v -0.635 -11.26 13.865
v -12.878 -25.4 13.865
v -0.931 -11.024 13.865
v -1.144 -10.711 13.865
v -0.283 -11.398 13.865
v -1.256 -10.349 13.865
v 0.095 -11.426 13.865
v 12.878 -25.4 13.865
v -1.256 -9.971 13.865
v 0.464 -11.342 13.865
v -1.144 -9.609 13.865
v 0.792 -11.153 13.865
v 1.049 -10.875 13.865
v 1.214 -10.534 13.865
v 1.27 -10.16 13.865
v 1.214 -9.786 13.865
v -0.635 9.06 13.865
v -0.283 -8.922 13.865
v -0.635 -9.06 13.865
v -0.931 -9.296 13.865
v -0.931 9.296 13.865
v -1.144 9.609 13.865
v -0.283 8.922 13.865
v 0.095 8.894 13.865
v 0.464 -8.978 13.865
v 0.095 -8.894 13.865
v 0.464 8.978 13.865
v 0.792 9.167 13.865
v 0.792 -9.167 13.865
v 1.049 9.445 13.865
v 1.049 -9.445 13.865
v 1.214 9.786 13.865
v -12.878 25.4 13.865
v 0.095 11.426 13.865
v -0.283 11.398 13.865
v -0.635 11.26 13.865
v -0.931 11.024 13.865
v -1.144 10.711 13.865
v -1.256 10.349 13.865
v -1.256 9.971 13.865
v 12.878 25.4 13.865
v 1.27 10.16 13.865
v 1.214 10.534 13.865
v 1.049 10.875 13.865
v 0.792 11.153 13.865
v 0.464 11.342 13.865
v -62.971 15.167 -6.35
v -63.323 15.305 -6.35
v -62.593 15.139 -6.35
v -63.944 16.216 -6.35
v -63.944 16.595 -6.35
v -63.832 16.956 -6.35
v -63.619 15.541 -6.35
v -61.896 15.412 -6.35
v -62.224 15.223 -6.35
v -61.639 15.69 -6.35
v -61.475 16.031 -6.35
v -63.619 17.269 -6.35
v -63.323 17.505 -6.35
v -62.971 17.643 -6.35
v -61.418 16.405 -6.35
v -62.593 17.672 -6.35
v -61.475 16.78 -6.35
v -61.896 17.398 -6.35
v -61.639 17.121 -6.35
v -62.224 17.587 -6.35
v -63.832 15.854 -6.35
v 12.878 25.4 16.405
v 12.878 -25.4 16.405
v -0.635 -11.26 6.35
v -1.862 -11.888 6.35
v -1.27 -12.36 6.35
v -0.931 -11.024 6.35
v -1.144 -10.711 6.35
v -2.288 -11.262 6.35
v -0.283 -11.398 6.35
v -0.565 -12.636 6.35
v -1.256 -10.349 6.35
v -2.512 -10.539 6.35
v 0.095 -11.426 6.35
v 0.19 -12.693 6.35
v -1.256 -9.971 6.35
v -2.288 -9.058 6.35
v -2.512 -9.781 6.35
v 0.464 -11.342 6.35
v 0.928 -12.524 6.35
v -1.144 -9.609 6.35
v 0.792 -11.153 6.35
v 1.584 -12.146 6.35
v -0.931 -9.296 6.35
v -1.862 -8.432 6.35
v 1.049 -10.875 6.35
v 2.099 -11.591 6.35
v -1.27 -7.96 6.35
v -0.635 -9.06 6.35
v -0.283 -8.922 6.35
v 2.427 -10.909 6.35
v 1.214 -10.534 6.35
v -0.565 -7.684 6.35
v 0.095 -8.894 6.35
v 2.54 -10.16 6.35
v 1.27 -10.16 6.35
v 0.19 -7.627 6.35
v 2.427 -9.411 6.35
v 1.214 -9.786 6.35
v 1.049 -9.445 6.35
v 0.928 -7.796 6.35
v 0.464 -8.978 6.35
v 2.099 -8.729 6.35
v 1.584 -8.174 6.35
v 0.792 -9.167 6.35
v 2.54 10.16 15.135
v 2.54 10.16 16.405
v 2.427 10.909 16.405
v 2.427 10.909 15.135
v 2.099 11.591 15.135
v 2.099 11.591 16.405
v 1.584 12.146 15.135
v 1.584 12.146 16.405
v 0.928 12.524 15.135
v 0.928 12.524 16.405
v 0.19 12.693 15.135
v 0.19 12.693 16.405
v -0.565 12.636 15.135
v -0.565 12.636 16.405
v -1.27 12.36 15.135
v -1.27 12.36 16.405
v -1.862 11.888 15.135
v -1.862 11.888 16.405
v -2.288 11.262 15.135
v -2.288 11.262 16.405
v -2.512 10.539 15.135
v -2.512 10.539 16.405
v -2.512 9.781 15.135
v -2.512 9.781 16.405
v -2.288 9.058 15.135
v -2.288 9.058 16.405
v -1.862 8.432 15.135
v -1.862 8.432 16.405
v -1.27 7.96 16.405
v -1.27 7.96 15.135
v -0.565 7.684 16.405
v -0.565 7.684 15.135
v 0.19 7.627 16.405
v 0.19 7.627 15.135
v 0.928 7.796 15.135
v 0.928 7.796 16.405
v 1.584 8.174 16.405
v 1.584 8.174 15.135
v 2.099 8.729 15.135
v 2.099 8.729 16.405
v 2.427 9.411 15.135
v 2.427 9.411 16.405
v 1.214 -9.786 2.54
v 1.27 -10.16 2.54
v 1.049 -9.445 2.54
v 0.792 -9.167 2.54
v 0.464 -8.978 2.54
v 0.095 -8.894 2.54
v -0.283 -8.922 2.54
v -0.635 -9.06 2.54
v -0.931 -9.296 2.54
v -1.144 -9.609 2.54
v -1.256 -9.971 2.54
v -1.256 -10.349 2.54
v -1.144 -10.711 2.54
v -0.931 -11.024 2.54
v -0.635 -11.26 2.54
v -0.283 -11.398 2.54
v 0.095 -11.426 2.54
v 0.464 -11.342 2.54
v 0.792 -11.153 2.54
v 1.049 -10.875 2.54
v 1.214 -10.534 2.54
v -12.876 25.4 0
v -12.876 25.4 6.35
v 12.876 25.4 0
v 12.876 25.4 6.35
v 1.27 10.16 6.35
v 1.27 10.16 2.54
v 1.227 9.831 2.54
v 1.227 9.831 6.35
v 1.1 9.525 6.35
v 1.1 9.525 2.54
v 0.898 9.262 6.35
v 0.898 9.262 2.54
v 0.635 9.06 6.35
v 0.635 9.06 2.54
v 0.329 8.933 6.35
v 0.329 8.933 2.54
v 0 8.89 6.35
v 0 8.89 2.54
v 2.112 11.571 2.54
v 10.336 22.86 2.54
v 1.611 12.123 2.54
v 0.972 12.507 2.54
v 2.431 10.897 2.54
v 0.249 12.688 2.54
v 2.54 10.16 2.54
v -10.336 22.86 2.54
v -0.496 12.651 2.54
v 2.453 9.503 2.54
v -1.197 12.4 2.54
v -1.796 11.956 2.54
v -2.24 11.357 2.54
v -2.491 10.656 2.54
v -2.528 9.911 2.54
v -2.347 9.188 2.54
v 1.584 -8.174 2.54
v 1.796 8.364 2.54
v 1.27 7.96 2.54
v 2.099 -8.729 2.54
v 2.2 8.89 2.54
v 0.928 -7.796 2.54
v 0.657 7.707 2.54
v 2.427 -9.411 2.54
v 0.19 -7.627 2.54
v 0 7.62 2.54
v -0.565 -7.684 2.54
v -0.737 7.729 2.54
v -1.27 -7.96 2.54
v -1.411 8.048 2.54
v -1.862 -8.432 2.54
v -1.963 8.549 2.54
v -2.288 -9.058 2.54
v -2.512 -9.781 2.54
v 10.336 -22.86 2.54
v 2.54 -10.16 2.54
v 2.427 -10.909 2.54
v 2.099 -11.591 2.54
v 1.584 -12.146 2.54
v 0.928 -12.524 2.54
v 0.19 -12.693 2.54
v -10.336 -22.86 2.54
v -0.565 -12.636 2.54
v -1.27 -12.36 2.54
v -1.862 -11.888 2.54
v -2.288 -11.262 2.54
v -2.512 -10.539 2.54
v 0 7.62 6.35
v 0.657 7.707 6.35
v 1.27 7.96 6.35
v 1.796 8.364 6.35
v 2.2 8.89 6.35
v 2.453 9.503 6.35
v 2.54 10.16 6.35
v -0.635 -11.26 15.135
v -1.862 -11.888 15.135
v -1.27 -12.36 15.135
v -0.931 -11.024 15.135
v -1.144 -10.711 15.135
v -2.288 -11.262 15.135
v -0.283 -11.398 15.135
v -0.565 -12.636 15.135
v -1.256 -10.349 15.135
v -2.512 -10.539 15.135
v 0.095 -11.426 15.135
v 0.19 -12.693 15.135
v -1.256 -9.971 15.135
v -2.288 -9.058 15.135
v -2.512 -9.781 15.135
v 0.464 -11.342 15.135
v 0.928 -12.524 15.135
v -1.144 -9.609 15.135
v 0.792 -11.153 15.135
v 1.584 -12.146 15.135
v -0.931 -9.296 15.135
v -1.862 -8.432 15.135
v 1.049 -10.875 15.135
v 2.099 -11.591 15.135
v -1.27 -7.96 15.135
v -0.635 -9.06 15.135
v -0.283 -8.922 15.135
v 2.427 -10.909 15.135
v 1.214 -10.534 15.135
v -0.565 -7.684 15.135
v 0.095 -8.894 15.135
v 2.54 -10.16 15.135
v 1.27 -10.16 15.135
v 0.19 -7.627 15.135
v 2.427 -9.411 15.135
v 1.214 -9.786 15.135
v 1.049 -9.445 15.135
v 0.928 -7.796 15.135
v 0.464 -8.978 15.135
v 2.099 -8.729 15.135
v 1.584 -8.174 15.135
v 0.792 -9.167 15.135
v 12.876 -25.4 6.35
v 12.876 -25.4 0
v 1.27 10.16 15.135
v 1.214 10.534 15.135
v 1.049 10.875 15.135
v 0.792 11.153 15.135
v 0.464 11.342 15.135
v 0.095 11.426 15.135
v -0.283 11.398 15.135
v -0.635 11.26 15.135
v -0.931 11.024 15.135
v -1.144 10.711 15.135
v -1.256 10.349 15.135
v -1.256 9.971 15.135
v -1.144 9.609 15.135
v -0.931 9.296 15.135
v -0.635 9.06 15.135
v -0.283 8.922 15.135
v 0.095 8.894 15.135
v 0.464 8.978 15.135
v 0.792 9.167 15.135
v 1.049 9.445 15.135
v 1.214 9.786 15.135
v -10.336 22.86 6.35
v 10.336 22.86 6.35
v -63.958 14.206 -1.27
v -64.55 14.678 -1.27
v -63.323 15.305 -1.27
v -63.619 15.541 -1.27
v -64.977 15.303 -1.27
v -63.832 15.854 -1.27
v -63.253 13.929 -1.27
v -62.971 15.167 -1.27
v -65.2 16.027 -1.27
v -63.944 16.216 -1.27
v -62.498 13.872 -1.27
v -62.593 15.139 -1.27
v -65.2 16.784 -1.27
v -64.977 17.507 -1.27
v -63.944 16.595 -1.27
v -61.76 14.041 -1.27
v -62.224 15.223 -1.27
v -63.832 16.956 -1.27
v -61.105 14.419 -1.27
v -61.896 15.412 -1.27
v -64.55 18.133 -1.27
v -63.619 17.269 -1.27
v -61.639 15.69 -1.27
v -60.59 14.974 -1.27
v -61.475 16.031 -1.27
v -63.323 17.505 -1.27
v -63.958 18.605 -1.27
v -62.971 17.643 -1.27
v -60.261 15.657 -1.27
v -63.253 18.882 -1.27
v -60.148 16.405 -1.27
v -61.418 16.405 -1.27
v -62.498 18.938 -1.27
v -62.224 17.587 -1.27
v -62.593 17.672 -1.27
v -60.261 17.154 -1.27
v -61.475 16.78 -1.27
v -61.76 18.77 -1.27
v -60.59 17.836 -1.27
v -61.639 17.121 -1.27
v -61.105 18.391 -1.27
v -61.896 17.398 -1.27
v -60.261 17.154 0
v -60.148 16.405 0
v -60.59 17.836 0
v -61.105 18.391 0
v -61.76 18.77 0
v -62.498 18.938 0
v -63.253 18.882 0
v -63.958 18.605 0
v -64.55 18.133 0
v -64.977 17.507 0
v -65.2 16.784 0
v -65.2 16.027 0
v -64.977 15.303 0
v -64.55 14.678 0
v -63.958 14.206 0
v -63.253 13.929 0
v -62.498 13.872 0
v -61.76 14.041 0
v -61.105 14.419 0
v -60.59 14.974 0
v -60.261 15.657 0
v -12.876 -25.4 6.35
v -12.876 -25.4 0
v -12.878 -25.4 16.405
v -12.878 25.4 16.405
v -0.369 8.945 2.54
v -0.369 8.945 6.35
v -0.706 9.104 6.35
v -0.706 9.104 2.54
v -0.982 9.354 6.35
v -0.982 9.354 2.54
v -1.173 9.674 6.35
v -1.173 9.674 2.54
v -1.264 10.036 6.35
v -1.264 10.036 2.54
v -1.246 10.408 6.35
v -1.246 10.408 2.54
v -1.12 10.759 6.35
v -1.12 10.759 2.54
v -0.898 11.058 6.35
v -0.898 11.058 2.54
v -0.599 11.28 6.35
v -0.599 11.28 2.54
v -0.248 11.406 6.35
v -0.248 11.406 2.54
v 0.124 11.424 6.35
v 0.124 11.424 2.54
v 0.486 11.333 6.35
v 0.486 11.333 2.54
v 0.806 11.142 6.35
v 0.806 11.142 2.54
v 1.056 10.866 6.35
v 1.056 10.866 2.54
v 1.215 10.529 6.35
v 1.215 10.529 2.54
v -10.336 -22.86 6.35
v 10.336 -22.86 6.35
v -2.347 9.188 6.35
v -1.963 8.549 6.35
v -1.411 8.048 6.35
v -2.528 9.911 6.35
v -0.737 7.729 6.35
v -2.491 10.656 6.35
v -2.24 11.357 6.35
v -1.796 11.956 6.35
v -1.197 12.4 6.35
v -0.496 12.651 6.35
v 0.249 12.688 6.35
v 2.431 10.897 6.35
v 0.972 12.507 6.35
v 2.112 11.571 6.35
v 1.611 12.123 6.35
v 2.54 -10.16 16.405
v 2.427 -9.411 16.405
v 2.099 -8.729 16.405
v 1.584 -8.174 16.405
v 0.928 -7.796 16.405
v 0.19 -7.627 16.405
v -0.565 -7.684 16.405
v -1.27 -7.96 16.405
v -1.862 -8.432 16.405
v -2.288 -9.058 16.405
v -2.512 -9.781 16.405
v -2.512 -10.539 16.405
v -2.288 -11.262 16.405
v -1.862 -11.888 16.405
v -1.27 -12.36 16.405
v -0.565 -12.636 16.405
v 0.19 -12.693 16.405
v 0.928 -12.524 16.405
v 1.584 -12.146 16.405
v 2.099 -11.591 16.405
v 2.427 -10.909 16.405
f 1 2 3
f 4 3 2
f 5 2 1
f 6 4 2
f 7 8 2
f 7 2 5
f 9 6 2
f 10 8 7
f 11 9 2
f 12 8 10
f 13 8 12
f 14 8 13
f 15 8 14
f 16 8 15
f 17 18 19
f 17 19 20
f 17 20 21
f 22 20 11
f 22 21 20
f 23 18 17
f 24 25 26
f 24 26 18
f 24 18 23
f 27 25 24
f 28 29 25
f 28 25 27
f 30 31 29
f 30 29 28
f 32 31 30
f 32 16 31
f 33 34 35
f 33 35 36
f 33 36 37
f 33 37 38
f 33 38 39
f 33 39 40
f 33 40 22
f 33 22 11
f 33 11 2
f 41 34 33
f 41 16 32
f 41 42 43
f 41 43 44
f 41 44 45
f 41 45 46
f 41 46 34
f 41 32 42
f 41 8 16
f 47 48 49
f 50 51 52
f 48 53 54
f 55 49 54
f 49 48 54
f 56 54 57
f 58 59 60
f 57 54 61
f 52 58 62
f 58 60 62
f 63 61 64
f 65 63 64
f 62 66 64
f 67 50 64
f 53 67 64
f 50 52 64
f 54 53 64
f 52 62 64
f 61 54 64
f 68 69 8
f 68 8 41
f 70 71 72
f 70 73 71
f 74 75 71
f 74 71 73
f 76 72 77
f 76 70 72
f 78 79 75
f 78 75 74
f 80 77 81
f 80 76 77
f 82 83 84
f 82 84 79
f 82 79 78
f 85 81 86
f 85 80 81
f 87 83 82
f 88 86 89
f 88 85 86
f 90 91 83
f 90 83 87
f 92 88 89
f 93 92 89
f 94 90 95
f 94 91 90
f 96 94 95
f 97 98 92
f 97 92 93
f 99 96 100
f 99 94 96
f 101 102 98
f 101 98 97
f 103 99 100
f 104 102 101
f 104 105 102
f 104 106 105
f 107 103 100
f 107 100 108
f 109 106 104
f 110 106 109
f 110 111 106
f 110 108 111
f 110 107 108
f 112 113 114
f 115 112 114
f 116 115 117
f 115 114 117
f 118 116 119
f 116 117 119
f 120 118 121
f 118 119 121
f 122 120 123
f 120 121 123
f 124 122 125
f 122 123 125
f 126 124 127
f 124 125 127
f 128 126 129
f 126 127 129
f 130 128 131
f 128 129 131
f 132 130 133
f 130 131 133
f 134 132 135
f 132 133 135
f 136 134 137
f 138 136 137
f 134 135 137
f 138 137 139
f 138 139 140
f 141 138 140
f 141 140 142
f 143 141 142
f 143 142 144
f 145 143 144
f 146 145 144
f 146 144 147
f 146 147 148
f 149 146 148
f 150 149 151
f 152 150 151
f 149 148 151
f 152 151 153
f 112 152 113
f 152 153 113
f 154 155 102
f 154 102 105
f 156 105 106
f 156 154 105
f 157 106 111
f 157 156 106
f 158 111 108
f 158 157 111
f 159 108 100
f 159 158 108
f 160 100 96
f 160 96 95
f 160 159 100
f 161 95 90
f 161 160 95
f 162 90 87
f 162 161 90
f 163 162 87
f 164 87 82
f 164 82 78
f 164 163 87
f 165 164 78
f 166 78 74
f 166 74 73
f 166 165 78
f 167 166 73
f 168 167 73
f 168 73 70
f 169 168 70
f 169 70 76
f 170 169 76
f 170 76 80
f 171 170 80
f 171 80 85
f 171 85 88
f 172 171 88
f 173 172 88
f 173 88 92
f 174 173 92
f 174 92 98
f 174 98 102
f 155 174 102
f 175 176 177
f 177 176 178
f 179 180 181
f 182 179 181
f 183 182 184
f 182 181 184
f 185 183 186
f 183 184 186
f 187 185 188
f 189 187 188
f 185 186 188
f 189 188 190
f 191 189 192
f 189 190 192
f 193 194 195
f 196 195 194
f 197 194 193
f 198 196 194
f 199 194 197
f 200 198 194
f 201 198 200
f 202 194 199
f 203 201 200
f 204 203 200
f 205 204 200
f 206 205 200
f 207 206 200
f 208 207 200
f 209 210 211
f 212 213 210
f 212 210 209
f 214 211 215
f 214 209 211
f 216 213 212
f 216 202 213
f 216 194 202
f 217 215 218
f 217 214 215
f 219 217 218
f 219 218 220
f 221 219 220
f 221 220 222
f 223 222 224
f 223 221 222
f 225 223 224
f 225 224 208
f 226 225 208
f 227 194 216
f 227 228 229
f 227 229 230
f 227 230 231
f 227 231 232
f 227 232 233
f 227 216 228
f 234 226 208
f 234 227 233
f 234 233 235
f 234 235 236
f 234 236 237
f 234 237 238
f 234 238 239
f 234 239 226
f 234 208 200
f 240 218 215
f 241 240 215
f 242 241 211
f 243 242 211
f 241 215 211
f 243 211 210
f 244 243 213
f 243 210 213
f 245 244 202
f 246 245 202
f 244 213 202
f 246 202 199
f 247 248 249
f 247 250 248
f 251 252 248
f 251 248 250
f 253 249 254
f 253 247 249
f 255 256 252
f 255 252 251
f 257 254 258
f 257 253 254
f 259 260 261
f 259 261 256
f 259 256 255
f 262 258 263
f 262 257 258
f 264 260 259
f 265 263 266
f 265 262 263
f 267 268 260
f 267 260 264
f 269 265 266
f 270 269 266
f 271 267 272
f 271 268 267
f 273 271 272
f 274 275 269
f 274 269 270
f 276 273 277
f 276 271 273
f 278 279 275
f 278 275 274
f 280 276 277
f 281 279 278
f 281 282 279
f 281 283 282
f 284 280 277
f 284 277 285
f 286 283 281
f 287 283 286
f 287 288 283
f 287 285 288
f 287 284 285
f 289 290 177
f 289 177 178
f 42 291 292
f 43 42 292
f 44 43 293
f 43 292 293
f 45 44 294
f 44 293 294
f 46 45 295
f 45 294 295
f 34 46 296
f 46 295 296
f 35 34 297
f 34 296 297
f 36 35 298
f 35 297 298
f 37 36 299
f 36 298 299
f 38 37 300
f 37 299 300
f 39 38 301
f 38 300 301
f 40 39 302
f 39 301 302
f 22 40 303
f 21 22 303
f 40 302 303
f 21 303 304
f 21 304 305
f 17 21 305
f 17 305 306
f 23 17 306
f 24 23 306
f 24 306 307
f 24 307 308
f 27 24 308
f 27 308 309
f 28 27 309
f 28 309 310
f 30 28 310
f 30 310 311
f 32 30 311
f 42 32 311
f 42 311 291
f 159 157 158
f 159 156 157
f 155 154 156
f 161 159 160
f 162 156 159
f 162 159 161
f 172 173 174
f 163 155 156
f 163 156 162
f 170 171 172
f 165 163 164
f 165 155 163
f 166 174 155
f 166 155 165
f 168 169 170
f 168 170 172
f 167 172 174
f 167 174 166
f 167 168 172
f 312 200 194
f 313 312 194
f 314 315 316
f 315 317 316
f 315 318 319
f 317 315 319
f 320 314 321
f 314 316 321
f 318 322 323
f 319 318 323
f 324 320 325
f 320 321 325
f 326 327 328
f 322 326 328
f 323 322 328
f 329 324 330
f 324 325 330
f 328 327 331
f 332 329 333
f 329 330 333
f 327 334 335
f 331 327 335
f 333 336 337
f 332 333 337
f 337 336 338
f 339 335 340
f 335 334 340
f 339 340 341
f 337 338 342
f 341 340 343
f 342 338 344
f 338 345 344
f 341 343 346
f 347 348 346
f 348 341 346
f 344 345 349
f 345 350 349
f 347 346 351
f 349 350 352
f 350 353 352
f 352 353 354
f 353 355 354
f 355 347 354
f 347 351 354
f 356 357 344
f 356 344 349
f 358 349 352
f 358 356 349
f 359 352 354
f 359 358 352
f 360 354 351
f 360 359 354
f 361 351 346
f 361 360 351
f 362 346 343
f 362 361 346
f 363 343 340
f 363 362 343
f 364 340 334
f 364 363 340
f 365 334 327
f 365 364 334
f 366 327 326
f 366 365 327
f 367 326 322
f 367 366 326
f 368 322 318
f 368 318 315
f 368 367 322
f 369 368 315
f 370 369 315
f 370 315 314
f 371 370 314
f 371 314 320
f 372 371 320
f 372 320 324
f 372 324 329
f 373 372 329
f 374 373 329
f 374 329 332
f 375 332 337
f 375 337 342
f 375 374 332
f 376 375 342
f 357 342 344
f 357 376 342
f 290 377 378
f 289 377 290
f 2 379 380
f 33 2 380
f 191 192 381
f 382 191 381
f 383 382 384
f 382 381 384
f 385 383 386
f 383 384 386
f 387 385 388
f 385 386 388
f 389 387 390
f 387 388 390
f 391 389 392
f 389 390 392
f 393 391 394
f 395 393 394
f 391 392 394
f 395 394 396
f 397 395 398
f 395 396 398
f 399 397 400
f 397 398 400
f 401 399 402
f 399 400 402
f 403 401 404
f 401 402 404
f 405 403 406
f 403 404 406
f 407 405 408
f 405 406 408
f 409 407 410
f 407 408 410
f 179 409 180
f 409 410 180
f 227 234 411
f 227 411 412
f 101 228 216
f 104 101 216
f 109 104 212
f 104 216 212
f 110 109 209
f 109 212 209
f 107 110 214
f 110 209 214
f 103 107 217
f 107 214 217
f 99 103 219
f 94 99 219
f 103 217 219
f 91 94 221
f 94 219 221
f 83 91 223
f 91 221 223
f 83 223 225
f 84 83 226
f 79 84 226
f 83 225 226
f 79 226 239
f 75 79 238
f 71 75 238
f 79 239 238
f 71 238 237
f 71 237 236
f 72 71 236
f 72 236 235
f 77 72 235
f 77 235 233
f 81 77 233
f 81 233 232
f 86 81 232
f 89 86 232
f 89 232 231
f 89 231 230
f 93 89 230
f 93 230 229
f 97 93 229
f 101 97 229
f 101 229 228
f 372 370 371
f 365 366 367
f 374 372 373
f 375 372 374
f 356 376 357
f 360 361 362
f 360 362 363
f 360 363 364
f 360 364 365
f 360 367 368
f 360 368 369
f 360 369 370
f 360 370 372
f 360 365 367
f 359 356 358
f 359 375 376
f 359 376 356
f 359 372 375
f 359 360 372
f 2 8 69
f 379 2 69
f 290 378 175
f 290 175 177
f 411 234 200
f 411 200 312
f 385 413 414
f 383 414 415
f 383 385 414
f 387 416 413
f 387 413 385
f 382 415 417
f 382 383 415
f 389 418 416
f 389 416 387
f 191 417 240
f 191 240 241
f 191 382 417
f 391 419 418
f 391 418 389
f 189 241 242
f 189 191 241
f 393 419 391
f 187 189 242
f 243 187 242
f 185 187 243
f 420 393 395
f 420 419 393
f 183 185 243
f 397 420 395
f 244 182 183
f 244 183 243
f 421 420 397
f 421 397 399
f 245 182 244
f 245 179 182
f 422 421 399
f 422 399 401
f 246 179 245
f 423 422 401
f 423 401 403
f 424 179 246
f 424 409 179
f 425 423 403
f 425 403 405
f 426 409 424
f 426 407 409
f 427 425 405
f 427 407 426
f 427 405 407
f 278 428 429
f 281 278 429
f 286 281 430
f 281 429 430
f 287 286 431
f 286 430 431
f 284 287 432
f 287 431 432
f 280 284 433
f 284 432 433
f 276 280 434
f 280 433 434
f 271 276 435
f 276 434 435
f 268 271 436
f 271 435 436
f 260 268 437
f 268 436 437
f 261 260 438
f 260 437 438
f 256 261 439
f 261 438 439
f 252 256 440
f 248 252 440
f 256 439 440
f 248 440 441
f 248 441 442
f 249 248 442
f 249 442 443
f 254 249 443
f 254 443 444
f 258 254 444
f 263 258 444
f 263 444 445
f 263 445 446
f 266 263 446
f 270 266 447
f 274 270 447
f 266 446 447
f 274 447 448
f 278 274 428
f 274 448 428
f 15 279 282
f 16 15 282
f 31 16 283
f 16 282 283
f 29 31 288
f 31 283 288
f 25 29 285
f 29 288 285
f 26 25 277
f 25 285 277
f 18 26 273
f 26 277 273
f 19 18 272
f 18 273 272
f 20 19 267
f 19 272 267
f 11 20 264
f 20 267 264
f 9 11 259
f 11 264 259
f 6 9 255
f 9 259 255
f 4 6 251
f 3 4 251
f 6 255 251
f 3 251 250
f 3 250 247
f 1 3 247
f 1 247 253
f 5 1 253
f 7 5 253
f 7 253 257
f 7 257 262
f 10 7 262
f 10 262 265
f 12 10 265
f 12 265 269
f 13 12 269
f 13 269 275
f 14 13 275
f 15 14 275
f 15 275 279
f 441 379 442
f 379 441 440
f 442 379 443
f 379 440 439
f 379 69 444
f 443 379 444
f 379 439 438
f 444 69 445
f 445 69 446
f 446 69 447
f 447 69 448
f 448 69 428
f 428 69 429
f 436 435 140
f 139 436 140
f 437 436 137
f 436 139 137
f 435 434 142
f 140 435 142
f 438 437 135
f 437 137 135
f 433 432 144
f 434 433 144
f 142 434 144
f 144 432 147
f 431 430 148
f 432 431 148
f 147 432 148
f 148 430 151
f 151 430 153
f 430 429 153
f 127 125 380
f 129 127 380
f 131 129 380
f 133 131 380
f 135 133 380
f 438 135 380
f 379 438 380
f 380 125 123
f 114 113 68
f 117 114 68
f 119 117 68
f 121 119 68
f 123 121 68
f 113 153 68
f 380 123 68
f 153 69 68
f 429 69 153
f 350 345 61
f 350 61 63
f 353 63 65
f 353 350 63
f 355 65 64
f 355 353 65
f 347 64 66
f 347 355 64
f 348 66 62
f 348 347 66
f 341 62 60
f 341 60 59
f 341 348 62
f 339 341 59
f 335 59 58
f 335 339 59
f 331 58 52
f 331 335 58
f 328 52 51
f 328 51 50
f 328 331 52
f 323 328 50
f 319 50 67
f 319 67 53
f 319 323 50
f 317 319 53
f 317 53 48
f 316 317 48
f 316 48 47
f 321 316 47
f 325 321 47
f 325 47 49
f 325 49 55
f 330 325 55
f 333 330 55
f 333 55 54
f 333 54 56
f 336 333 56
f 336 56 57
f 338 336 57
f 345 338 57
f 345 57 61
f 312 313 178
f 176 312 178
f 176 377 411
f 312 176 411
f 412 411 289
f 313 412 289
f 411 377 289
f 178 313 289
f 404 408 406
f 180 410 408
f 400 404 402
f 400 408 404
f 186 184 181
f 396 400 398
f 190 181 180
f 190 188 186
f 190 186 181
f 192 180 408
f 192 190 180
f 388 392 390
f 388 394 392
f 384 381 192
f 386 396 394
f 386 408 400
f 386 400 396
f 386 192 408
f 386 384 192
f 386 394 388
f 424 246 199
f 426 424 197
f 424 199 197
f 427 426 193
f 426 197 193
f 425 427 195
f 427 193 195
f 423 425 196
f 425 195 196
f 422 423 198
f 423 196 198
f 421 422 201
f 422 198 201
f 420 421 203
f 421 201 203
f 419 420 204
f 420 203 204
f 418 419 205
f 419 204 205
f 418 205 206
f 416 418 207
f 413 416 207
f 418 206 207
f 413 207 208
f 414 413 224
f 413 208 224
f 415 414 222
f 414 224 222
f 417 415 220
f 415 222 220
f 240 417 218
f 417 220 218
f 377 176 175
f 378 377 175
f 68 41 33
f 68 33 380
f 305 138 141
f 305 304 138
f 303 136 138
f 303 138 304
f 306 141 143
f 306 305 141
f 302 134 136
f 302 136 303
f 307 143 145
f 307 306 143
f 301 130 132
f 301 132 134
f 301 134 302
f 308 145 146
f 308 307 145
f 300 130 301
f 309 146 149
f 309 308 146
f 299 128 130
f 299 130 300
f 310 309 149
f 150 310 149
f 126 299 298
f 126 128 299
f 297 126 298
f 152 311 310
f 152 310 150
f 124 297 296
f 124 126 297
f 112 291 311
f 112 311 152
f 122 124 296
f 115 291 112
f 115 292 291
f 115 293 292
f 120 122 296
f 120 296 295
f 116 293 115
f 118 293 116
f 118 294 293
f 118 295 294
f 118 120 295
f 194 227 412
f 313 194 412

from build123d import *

# Parameters (mm, degrees)
F0_W      = 2.54
F0_H      = 3.81
F1_DEPTH  = 25.4
F2_W      = 25.751915136
F2_H      = 2.54
F3_DEPTH  = 6.35
F4_R      = 2.54
F4_R_2    = 1.2700000079
F5_DEPTH  = 6.35
F6_W      = 50.8
F6_H      = 2.54
F7_DEPTH  = 12.8778
F8_R      = 2.54
F8_R_2    = 1.2700000079
F9_DEPTH  = 1.27
F10_DEPTH = 25.4
F11_R     = 2.54
F11_R_2   = 1.2700036168
F12_DEPTH = 1.27
F13_DEPTH = 6.35


with BuildPart() as f1:
    # F0 (on Front) → F1 (new body, symmetric)
    with BuildSketch(Plane.XZ):
        Polygon((-10.335957568, 2.54), (-12.875957568, 2.54), (-12.875957568, 0), (12.875957568, 0), (12.875957568, 2.54), (10.335957568, 2.54), align=None)
        with Locations((-11.605957568, 4.445)):
            Rectangle(F0_W, F0_H)
        with Locations((11.605957568, 4.445)):
            Rectangle(F0_W, F0_H)
    extrude(amount=F1_DEPTH, both=True)

    # F2 (on Top) → F3 (join)
    with BuildSketch(Plane.XY):
        with Locations((0, -24.13)):
            Rectangle(F2_W, F2_H)
        with Locations((0, 24.13)):
            Rectangle(F2_W, F2_H)
    extrude(amount=F3_DEPTH)

    # F4 (on Top) → F5 (join)
    with BuildSketch(Plane.XY):
        with Locations((0, -10.16)):
            Circle(F4_R)
        with Locations((0, -10.16)):
            Circle(F4_R_2, mode=Mode.SUBTRACT)
        with BuildLine():
            ThreePointArc((2.54, 10.16), (-1.7960512242, 11.9560512242), (0, 7.62))
            ThreePointArc((0, 7.62), (1.7960512242, 8.3639487758), (2.54, 10.16))
        make_face()
        with BuildLine():
            ThreePointArc((1.2700000079, 10.16), (0.8980256177, 9.2619743823), (0, 8.8899999921))
            ThreePointArc((0, 8.8899999921), (-0.8980256177, 11.0580256177), (1.2700000079, 10.16))
        make_face(mode=Mode.SUBTRACT)
    extrude(amount=F5_DEPTH)


with BuildPart() as f7:
    # F6 (on Right) → F7 (new body, symmetric)
    with BuildSketch(Plane.YZ):
        with Locations((0, 15.1352581558)):
            Rectangle(F6_W, F6_H)
    extrude(amount=F7_DEPTH, both=True)

    # F8 (on face) → F9 (cut)
    with BuildSketch(Plane.XY.offset(16.4052581558)):
        with Locations((0, -10.16)):
            Circle(F8_R)
        with Locations((0, -10.16)):
            Circle(F8_R_2, mode=Mode.SUBTRACT)
        with Locations((0, 10.16)):
            Circle(F8_R)
        with Locations((0, 10.16)):
            Circle(F8_R_2, mode=Mode.SUBTRACT)
    extrude(amount=-F9_DEPTH, mode=Mode.SUBTRACT)

    # F10 (cut): faces of the model
    f10_faces = [f7.faces().sort_by_distance(p)[0] for p in [
        (0, -10.16, 16.4052581558),
        (0, 10.16, 16.4052581558),
    ]]
    extrude(f10_faces, amount=-F10_DEPTH, mode=Mode.SUBTRACT)


with BuildPart() as f12:
    # F11 (on Top) → F12 (new body)
    with BuildSketch(Plane.XY):
        with Locations((-62.6882463694, 16.4052583277)):
            Circle(F11_R)
        with Locations((-62.6882463694, 16.4052583277)):
            Circle(F11_R_2, mode=Mode.SUBTRACT)
    extrude(amount=-F12_DEPTH)

    # F11 (on Top) → F13 (join)
    with BuildSketch(Plane.XY):
        with Locations((-62.6882463694, 16.4052583277)):
            Circle(F11_R_2)
    extrude(amount=-F13_DEPTH)


solid = Compound([f1.part, f7.part, f12.part])
